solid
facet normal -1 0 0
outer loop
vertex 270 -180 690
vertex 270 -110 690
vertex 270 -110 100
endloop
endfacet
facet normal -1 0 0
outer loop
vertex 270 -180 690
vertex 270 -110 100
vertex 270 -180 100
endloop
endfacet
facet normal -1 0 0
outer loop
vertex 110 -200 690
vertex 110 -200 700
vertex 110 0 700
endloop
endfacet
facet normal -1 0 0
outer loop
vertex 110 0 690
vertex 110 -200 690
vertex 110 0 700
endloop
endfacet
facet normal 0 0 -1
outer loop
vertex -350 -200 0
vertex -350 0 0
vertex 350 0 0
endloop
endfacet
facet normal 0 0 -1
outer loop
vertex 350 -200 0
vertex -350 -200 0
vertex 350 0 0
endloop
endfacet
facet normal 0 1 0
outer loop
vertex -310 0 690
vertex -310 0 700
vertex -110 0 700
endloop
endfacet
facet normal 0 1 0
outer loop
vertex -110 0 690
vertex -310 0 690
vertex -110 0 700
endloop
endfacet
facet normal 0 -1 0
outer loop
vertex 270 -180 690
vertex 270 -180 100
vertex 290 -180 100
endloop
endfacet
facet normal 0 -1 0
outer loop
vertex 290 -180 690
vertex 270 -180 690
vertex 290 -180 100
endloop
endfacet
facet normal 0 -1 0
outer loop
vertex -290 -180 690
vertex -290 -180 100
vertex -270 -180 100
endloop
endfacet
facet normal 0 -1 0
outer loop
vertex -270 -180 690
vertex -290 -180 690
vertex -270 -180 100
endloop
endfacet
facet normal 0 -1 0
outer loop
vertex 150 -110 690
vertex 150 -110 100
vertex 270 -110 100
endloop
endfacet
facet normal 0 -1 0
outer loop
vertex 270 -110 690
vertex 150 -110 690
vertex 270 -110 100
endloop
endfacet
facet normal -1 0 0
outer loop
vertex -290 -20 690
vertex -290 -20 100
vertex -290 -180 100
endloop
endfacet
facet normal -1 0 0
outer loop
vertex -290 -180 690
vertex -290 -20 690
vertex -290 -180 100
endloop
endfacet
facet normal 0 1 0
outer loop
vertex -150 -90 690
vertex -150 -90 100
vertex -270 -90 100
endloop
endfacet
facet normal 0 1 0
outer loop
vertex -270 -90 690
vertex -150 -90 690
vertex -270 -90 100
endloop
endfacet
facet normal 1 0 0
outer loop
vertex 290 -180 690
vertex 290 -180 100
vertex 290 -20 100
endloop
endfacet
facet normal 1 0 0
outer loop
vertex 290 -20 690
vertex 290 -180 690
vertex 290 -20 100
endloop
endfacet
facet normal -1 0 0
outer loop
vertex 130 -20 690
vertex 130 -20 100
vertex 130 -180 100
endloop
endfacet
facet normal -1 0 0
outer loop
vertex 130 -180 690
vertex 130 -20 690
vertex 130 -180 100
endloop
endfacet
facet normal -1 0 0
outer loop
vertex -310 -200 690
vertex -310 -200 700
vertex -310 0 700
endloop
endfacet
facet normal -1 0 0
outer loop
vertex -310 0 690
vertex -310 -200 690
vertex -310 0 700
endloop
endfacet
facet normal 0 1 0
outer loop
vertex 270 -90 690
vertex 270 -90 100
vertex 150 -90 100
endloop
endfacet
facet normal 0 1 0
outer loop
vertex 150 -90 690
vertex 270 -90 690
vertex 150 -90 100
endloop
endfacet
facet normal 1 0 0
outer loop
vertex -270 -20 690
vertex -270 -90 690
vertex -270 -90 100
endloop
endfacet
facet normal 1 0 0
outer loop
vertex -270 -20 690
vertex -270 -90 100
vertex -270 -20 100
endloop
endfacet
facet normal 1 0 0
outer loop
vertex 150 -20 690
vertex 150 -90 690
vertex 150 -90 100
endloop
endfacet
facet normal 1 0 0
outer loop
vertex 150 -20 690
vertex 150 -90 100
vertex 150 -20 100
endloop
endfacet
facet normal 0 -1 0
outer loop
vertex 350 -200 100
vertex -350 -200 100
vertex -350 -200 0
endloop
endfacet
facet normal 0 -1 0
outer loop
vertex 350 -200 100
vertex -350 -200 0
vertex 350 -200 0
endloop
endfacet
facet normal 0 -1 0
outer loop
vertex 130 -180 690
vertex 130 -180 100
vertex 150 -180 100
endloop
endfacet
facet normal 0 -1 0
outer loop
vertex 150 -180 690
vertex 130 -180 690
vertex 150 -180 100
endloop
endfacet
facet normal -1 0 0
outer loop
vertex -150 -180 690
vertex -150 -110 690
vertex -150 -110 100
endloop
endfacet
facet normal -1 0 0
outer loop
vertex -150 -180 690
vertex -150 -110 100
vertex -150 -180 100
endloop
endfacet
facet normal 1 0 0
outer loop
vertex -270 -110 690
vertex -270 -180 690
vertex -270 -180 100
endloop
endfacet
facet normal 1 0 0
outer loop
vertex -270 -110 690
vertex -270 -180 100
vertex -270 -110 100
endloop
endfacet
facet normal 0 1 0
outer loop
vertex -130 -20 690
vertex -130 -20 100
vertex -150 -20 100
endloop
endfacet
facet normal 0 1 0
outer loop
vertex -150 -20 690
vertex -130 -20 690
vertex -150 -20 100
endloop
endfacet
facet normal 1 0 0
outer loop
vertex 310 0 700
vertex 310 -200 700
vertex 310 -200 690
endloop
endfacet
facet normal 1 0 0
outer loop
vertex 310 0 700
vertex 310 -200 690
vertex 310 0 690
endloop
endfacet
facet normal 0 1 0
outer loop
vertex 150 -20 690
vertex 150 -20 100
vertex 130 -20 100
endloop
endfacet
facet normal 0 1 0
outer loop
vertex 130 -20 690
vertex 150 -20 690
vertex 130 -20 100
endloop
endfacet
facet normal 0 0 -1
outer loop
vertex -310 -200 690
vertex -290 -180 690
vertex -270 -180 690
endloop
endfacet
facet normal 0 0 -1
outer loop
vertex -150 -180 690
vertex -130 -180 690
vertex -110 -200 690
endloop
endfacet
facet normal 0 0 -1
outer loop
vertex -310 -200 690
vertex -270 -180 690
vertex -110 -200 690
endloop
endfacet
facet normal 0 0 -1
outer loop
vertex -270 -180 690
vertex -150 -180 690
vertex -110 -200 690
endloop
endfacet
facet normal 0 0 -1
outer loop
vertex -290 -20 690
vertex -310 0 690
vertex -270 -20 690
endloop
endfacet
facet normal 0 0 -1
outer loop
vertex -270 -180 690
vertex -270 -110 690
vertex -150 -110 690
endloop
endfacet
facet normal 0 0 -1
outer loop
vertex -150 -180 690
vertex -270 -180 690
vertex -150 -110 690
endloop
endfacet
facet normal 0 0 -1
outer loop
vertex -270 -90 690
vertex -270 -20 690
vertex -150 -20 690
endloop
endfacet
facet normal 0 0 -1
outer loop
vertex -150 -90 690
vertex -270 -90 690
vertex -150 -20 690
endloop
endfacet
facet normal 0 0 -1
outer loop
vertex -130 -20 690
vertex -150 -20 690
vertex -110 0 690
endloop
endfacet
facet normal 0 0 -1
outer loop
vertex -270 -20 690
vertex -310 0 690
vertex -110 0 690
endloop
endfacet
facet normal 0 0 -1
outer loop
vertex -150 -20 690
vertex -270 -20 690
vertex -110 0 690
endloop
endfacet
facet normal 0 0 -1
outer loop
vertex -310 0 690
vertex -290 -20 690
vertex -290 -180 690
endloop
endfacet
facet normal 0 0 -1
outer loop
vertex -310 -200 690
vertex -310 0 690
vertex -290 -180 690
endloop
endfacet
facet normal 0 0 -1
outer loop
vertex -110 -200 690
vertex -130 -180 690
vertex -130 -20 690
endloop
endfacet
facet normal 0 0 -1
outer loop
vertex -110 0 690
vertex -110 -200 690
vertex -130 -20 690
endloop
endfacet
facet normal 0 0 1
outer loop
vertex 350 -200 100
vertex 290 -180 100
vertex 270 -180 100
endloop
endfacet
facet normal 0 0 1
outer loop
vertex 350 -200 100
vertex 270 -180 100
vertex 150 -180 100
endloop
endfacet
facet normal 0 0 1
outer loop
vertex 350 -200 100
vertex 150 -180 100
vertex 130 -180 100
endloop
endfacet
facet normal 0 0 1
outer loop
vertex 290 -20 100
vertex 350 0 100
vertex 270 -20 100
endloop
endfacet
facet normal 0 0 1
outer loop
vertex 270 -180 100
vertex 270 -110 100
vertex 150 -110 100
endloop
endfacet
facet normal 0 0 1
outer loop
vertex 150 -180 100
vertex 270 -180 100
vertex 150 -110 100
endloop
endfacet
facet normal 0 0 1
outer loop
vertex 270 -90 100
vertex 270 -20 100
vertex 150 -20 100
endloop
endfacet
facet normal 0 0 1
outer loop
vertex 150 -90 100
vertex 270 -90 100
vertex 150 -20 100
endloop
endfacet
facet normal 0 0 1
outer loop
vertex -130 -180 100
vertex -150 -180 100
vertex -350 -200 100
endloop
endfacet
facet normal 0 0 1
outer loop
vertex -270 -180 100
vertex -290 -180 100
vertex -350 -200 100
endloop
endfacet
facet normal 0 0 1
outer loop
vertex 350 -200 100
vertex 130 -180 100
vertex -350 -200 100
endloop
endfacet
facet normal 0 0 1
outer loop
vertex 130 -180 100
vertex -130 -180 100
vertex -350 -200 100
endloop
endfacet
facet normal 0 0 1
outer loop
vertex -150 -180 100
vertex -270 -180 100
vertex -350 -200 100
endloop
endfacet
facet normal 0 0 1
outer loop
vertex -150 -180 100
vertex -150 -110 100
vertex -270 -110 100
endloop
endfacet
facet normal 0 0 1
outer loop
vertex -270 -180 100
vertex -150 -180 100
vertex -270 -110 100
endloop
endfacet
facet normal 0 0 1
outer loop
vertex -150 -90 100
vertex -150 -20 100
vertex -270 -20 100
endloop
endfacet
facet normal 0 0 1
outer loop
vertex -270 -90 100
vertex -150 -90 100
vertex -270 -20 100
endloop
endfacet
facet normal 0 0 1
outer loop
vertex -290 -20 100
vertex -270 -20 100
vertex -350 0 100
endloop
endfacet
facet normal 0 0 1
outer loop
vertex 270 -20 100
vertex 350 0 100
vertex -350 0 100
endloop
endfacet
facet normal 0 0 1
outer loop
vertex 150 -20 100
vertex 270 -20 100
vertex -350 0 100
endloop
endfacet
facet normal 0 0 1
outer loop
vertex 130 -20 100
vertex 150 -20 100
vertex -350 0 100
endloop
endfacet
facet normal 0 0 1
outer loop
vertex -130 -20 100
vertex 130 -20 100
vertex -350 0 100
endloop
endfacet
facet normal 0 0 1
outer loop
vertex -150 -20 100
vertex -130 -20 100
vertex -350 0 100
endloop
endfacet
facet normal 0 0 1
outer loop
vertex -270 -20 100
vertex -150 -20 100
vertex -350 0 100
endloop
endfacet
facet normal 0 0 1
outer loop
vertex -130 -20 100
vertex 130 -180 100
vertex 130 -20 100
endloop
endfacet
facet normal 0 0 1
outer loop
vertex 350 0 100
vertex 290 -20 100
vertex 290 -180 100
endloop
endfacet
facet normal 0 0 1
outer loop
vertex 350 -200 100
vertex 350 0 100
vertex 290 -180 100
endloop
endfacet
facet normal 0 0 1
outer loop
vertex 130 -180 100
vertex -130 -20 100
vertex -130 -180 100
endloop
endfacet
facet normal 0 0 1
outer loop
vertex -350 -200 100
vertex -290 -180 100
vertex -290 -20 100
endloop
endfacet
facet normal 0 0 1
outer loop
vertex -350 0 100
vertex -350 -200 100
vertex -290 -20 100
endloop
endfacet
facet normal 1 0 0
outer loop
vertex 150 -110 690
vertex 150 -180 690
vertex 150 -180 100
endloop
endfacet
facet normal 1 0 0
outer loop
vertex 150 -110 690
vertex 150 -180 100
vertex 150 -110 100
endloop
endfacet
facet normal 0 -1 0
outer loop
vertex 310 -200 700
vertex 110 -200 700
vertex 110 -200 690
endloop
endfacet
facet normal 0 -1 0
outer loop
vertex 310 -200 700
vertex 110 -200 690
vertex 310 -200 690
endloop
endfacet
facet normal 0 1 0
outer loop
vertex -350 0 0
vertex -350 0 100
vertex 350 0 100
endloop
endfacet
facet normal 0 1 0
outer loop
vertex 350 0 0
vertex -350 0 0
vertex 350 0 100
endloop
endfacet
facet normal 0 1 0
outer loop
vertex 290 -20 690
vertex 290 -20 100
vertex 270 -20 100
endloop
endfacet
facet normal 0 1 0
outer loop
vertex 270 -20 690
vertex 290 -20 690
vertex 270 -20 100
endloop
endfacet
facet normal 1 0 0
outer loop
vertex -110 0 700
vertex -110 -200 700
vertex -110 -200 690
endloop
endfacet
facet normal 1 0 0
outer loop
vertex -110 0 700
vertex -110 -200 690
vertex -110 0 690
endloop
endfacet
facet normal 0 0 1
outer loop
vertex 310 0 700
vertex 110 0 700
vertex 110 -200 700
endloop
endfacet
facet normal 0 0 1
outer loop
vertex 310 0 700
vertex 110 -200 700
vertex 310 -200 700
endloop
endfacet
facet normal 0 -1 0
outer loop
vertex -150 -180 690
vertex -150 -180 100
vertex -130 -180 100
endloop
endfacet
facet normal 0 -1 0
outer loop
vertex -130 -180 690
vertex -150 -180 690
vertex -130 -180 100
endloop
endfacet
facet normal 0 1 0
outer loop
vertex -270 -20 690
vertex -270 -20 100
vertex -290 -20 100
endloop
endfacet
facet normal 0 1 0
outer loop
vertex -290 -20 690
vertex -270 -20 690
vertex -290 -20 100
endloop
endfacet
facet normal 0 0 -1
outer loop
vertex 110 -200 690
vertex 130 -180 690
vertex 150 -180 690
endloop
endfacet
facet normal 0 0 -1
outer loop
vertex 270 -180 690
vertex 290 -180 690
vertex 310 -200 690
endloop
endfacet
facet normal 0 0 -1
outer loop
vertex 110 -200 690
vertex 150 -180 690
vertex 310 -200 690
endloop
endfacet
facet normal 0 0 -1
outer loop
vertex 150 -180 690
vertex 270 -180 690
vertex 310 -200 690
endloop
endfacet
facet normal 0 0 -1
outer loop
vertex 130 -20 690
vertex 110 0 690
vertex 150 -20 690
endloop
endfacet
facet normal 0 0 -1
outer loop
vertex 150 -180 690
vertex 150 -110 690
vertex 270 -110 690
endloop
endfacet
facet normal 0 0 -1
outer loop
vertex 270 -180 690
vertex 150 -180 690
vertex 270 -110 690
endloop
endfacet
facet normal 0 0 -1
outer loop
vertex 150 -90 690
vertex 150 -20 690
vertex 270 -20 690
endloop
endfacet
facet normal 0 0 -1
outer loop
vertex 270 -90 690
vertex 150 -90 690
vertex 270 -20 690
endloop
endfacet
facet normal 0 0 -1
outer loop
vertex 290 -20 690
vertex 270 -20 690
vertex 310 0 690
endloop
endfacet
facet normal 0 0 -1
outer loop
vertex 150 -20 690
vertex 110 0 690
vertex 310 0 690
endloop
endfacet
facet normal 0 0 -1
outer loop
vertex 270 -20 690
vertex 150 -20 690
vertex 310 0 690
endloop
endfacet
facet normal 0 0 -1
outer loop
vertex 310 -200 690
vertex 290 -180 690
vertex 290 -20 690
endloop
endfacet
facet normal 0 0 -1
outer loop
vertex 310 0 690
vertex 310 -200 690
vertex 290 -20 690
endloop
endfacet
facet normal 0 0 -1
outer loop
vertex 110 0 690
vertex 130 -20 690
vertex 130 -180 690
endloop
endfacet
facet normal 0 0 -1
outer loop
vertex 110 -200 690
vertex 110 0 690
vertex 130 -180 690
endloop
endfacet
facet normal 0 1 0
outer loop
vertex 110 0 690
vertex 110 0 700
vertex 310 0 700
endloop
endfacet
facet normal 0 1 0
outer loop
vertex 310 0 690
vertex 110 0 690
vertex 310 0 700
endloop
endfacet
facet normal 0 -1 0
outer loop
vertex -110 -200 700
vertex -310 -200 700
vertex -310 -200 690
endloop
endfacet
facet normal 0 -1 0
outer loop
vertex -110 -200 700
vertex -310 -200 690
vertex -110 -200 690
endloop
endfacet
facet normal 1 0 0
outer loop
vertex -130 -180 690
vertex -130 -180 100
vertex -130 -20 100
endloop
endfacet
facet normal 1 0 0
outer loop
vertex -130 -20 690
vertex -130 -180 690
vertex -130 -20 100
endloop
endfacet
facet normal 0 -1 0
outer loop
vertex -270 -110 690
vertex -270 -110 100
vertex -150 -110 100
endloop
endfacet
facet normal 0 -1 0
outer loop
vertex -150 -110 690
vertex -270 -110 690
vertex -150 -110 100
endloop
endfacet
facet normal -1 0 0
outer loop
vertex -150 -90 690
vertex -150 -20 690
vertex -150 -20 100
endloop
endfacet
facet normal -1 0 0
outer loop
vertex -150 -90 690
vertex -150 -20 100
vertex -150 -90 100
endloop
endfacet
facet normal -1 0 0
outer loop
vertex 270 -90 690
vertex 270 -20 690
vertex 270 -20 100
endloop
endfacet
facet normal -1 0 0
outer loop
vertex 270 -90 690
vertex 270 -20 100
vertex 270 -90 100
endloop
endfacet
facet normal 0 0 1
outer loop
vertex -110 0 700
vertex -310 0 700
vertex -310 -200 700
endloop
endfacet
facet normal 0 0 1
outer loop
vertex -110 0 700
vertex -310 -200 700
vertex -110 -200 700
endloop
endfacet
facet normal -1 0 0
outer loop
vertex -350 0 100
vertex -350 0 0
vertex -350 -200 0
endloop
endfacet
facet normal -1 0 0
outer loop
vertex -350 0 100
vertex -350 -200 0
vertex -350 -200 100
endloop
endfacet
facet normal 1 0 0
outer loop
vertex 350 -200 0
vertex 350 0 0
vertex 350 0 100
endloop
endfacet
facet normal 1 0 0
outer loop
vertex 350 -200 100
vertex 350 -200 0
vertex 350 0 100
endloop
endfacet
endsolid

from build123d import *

# Parameters (mm, degrees)
F0_W     = 350
F0_H     = 100
F1_DEPTH = 200
F3_DEPTH = 600
F4_W     = 200
F4_H     = 200
F5_DEPTH = 10


with BuildPart() as f1:
    # F0 (on Front) → F1 (new body)
    with BuildSketch(Plane.XZ):
        with Locations((-175, 50)):
            Rectangle(F0_W, F0_H)
        with Locations((175, 50)):
            Rectangle(F0_W, F0_H)
    extrude(amount=F1_DEPTH)

    # F2 (on face) → F3 (join)
    with BuildSketch(Plane.XY.offset(100)):
        Polygon((-130, -180), (-130, -20), (-150, -20), (-150, -90), (-270, -90), (-270, -20), (-290, -20), (-290, -180), (-270, -180), (-270, -110), (-150, -110), (-150, -180), align=None)
        Polygon((150, -20), (130, -20), (130, -180), (150, -180), (150, -110), (270, -110), (270, -180), (290, -180), (290, -20), (270, -20), (270, -90), (150, -90), align=None)
    extrude(amount=F3_DEPTH)

    # F4 (on face) → F5 (join)
    with BuildSketch(Plane.XY.offset(700)):
        with Locations((210, -100)):
            Rectangle(F4_W, F4_H)
        Polygon((130, -20), (150, -20), (150, -90), (270, -90), (270, -20), (290, -20), (290, -180), (270, -180), (270, -110), (150, -110), (150, -180), (130, -180), align=None, mode=Mode.SUBTRACT)
        Polygon((150, -90), (150, -20), (130, -20), (130, -180), (150, -180), (150, -110), (270, -110), (270, -180), (290, -180), (290, -20), (270, -20), (270, -90), align=None)
        with Locations((-210, -100)):
            Rectangle(F4_W, F4_H)
    extrude(amount=-F5_DEPTH)


solid = f1.part
